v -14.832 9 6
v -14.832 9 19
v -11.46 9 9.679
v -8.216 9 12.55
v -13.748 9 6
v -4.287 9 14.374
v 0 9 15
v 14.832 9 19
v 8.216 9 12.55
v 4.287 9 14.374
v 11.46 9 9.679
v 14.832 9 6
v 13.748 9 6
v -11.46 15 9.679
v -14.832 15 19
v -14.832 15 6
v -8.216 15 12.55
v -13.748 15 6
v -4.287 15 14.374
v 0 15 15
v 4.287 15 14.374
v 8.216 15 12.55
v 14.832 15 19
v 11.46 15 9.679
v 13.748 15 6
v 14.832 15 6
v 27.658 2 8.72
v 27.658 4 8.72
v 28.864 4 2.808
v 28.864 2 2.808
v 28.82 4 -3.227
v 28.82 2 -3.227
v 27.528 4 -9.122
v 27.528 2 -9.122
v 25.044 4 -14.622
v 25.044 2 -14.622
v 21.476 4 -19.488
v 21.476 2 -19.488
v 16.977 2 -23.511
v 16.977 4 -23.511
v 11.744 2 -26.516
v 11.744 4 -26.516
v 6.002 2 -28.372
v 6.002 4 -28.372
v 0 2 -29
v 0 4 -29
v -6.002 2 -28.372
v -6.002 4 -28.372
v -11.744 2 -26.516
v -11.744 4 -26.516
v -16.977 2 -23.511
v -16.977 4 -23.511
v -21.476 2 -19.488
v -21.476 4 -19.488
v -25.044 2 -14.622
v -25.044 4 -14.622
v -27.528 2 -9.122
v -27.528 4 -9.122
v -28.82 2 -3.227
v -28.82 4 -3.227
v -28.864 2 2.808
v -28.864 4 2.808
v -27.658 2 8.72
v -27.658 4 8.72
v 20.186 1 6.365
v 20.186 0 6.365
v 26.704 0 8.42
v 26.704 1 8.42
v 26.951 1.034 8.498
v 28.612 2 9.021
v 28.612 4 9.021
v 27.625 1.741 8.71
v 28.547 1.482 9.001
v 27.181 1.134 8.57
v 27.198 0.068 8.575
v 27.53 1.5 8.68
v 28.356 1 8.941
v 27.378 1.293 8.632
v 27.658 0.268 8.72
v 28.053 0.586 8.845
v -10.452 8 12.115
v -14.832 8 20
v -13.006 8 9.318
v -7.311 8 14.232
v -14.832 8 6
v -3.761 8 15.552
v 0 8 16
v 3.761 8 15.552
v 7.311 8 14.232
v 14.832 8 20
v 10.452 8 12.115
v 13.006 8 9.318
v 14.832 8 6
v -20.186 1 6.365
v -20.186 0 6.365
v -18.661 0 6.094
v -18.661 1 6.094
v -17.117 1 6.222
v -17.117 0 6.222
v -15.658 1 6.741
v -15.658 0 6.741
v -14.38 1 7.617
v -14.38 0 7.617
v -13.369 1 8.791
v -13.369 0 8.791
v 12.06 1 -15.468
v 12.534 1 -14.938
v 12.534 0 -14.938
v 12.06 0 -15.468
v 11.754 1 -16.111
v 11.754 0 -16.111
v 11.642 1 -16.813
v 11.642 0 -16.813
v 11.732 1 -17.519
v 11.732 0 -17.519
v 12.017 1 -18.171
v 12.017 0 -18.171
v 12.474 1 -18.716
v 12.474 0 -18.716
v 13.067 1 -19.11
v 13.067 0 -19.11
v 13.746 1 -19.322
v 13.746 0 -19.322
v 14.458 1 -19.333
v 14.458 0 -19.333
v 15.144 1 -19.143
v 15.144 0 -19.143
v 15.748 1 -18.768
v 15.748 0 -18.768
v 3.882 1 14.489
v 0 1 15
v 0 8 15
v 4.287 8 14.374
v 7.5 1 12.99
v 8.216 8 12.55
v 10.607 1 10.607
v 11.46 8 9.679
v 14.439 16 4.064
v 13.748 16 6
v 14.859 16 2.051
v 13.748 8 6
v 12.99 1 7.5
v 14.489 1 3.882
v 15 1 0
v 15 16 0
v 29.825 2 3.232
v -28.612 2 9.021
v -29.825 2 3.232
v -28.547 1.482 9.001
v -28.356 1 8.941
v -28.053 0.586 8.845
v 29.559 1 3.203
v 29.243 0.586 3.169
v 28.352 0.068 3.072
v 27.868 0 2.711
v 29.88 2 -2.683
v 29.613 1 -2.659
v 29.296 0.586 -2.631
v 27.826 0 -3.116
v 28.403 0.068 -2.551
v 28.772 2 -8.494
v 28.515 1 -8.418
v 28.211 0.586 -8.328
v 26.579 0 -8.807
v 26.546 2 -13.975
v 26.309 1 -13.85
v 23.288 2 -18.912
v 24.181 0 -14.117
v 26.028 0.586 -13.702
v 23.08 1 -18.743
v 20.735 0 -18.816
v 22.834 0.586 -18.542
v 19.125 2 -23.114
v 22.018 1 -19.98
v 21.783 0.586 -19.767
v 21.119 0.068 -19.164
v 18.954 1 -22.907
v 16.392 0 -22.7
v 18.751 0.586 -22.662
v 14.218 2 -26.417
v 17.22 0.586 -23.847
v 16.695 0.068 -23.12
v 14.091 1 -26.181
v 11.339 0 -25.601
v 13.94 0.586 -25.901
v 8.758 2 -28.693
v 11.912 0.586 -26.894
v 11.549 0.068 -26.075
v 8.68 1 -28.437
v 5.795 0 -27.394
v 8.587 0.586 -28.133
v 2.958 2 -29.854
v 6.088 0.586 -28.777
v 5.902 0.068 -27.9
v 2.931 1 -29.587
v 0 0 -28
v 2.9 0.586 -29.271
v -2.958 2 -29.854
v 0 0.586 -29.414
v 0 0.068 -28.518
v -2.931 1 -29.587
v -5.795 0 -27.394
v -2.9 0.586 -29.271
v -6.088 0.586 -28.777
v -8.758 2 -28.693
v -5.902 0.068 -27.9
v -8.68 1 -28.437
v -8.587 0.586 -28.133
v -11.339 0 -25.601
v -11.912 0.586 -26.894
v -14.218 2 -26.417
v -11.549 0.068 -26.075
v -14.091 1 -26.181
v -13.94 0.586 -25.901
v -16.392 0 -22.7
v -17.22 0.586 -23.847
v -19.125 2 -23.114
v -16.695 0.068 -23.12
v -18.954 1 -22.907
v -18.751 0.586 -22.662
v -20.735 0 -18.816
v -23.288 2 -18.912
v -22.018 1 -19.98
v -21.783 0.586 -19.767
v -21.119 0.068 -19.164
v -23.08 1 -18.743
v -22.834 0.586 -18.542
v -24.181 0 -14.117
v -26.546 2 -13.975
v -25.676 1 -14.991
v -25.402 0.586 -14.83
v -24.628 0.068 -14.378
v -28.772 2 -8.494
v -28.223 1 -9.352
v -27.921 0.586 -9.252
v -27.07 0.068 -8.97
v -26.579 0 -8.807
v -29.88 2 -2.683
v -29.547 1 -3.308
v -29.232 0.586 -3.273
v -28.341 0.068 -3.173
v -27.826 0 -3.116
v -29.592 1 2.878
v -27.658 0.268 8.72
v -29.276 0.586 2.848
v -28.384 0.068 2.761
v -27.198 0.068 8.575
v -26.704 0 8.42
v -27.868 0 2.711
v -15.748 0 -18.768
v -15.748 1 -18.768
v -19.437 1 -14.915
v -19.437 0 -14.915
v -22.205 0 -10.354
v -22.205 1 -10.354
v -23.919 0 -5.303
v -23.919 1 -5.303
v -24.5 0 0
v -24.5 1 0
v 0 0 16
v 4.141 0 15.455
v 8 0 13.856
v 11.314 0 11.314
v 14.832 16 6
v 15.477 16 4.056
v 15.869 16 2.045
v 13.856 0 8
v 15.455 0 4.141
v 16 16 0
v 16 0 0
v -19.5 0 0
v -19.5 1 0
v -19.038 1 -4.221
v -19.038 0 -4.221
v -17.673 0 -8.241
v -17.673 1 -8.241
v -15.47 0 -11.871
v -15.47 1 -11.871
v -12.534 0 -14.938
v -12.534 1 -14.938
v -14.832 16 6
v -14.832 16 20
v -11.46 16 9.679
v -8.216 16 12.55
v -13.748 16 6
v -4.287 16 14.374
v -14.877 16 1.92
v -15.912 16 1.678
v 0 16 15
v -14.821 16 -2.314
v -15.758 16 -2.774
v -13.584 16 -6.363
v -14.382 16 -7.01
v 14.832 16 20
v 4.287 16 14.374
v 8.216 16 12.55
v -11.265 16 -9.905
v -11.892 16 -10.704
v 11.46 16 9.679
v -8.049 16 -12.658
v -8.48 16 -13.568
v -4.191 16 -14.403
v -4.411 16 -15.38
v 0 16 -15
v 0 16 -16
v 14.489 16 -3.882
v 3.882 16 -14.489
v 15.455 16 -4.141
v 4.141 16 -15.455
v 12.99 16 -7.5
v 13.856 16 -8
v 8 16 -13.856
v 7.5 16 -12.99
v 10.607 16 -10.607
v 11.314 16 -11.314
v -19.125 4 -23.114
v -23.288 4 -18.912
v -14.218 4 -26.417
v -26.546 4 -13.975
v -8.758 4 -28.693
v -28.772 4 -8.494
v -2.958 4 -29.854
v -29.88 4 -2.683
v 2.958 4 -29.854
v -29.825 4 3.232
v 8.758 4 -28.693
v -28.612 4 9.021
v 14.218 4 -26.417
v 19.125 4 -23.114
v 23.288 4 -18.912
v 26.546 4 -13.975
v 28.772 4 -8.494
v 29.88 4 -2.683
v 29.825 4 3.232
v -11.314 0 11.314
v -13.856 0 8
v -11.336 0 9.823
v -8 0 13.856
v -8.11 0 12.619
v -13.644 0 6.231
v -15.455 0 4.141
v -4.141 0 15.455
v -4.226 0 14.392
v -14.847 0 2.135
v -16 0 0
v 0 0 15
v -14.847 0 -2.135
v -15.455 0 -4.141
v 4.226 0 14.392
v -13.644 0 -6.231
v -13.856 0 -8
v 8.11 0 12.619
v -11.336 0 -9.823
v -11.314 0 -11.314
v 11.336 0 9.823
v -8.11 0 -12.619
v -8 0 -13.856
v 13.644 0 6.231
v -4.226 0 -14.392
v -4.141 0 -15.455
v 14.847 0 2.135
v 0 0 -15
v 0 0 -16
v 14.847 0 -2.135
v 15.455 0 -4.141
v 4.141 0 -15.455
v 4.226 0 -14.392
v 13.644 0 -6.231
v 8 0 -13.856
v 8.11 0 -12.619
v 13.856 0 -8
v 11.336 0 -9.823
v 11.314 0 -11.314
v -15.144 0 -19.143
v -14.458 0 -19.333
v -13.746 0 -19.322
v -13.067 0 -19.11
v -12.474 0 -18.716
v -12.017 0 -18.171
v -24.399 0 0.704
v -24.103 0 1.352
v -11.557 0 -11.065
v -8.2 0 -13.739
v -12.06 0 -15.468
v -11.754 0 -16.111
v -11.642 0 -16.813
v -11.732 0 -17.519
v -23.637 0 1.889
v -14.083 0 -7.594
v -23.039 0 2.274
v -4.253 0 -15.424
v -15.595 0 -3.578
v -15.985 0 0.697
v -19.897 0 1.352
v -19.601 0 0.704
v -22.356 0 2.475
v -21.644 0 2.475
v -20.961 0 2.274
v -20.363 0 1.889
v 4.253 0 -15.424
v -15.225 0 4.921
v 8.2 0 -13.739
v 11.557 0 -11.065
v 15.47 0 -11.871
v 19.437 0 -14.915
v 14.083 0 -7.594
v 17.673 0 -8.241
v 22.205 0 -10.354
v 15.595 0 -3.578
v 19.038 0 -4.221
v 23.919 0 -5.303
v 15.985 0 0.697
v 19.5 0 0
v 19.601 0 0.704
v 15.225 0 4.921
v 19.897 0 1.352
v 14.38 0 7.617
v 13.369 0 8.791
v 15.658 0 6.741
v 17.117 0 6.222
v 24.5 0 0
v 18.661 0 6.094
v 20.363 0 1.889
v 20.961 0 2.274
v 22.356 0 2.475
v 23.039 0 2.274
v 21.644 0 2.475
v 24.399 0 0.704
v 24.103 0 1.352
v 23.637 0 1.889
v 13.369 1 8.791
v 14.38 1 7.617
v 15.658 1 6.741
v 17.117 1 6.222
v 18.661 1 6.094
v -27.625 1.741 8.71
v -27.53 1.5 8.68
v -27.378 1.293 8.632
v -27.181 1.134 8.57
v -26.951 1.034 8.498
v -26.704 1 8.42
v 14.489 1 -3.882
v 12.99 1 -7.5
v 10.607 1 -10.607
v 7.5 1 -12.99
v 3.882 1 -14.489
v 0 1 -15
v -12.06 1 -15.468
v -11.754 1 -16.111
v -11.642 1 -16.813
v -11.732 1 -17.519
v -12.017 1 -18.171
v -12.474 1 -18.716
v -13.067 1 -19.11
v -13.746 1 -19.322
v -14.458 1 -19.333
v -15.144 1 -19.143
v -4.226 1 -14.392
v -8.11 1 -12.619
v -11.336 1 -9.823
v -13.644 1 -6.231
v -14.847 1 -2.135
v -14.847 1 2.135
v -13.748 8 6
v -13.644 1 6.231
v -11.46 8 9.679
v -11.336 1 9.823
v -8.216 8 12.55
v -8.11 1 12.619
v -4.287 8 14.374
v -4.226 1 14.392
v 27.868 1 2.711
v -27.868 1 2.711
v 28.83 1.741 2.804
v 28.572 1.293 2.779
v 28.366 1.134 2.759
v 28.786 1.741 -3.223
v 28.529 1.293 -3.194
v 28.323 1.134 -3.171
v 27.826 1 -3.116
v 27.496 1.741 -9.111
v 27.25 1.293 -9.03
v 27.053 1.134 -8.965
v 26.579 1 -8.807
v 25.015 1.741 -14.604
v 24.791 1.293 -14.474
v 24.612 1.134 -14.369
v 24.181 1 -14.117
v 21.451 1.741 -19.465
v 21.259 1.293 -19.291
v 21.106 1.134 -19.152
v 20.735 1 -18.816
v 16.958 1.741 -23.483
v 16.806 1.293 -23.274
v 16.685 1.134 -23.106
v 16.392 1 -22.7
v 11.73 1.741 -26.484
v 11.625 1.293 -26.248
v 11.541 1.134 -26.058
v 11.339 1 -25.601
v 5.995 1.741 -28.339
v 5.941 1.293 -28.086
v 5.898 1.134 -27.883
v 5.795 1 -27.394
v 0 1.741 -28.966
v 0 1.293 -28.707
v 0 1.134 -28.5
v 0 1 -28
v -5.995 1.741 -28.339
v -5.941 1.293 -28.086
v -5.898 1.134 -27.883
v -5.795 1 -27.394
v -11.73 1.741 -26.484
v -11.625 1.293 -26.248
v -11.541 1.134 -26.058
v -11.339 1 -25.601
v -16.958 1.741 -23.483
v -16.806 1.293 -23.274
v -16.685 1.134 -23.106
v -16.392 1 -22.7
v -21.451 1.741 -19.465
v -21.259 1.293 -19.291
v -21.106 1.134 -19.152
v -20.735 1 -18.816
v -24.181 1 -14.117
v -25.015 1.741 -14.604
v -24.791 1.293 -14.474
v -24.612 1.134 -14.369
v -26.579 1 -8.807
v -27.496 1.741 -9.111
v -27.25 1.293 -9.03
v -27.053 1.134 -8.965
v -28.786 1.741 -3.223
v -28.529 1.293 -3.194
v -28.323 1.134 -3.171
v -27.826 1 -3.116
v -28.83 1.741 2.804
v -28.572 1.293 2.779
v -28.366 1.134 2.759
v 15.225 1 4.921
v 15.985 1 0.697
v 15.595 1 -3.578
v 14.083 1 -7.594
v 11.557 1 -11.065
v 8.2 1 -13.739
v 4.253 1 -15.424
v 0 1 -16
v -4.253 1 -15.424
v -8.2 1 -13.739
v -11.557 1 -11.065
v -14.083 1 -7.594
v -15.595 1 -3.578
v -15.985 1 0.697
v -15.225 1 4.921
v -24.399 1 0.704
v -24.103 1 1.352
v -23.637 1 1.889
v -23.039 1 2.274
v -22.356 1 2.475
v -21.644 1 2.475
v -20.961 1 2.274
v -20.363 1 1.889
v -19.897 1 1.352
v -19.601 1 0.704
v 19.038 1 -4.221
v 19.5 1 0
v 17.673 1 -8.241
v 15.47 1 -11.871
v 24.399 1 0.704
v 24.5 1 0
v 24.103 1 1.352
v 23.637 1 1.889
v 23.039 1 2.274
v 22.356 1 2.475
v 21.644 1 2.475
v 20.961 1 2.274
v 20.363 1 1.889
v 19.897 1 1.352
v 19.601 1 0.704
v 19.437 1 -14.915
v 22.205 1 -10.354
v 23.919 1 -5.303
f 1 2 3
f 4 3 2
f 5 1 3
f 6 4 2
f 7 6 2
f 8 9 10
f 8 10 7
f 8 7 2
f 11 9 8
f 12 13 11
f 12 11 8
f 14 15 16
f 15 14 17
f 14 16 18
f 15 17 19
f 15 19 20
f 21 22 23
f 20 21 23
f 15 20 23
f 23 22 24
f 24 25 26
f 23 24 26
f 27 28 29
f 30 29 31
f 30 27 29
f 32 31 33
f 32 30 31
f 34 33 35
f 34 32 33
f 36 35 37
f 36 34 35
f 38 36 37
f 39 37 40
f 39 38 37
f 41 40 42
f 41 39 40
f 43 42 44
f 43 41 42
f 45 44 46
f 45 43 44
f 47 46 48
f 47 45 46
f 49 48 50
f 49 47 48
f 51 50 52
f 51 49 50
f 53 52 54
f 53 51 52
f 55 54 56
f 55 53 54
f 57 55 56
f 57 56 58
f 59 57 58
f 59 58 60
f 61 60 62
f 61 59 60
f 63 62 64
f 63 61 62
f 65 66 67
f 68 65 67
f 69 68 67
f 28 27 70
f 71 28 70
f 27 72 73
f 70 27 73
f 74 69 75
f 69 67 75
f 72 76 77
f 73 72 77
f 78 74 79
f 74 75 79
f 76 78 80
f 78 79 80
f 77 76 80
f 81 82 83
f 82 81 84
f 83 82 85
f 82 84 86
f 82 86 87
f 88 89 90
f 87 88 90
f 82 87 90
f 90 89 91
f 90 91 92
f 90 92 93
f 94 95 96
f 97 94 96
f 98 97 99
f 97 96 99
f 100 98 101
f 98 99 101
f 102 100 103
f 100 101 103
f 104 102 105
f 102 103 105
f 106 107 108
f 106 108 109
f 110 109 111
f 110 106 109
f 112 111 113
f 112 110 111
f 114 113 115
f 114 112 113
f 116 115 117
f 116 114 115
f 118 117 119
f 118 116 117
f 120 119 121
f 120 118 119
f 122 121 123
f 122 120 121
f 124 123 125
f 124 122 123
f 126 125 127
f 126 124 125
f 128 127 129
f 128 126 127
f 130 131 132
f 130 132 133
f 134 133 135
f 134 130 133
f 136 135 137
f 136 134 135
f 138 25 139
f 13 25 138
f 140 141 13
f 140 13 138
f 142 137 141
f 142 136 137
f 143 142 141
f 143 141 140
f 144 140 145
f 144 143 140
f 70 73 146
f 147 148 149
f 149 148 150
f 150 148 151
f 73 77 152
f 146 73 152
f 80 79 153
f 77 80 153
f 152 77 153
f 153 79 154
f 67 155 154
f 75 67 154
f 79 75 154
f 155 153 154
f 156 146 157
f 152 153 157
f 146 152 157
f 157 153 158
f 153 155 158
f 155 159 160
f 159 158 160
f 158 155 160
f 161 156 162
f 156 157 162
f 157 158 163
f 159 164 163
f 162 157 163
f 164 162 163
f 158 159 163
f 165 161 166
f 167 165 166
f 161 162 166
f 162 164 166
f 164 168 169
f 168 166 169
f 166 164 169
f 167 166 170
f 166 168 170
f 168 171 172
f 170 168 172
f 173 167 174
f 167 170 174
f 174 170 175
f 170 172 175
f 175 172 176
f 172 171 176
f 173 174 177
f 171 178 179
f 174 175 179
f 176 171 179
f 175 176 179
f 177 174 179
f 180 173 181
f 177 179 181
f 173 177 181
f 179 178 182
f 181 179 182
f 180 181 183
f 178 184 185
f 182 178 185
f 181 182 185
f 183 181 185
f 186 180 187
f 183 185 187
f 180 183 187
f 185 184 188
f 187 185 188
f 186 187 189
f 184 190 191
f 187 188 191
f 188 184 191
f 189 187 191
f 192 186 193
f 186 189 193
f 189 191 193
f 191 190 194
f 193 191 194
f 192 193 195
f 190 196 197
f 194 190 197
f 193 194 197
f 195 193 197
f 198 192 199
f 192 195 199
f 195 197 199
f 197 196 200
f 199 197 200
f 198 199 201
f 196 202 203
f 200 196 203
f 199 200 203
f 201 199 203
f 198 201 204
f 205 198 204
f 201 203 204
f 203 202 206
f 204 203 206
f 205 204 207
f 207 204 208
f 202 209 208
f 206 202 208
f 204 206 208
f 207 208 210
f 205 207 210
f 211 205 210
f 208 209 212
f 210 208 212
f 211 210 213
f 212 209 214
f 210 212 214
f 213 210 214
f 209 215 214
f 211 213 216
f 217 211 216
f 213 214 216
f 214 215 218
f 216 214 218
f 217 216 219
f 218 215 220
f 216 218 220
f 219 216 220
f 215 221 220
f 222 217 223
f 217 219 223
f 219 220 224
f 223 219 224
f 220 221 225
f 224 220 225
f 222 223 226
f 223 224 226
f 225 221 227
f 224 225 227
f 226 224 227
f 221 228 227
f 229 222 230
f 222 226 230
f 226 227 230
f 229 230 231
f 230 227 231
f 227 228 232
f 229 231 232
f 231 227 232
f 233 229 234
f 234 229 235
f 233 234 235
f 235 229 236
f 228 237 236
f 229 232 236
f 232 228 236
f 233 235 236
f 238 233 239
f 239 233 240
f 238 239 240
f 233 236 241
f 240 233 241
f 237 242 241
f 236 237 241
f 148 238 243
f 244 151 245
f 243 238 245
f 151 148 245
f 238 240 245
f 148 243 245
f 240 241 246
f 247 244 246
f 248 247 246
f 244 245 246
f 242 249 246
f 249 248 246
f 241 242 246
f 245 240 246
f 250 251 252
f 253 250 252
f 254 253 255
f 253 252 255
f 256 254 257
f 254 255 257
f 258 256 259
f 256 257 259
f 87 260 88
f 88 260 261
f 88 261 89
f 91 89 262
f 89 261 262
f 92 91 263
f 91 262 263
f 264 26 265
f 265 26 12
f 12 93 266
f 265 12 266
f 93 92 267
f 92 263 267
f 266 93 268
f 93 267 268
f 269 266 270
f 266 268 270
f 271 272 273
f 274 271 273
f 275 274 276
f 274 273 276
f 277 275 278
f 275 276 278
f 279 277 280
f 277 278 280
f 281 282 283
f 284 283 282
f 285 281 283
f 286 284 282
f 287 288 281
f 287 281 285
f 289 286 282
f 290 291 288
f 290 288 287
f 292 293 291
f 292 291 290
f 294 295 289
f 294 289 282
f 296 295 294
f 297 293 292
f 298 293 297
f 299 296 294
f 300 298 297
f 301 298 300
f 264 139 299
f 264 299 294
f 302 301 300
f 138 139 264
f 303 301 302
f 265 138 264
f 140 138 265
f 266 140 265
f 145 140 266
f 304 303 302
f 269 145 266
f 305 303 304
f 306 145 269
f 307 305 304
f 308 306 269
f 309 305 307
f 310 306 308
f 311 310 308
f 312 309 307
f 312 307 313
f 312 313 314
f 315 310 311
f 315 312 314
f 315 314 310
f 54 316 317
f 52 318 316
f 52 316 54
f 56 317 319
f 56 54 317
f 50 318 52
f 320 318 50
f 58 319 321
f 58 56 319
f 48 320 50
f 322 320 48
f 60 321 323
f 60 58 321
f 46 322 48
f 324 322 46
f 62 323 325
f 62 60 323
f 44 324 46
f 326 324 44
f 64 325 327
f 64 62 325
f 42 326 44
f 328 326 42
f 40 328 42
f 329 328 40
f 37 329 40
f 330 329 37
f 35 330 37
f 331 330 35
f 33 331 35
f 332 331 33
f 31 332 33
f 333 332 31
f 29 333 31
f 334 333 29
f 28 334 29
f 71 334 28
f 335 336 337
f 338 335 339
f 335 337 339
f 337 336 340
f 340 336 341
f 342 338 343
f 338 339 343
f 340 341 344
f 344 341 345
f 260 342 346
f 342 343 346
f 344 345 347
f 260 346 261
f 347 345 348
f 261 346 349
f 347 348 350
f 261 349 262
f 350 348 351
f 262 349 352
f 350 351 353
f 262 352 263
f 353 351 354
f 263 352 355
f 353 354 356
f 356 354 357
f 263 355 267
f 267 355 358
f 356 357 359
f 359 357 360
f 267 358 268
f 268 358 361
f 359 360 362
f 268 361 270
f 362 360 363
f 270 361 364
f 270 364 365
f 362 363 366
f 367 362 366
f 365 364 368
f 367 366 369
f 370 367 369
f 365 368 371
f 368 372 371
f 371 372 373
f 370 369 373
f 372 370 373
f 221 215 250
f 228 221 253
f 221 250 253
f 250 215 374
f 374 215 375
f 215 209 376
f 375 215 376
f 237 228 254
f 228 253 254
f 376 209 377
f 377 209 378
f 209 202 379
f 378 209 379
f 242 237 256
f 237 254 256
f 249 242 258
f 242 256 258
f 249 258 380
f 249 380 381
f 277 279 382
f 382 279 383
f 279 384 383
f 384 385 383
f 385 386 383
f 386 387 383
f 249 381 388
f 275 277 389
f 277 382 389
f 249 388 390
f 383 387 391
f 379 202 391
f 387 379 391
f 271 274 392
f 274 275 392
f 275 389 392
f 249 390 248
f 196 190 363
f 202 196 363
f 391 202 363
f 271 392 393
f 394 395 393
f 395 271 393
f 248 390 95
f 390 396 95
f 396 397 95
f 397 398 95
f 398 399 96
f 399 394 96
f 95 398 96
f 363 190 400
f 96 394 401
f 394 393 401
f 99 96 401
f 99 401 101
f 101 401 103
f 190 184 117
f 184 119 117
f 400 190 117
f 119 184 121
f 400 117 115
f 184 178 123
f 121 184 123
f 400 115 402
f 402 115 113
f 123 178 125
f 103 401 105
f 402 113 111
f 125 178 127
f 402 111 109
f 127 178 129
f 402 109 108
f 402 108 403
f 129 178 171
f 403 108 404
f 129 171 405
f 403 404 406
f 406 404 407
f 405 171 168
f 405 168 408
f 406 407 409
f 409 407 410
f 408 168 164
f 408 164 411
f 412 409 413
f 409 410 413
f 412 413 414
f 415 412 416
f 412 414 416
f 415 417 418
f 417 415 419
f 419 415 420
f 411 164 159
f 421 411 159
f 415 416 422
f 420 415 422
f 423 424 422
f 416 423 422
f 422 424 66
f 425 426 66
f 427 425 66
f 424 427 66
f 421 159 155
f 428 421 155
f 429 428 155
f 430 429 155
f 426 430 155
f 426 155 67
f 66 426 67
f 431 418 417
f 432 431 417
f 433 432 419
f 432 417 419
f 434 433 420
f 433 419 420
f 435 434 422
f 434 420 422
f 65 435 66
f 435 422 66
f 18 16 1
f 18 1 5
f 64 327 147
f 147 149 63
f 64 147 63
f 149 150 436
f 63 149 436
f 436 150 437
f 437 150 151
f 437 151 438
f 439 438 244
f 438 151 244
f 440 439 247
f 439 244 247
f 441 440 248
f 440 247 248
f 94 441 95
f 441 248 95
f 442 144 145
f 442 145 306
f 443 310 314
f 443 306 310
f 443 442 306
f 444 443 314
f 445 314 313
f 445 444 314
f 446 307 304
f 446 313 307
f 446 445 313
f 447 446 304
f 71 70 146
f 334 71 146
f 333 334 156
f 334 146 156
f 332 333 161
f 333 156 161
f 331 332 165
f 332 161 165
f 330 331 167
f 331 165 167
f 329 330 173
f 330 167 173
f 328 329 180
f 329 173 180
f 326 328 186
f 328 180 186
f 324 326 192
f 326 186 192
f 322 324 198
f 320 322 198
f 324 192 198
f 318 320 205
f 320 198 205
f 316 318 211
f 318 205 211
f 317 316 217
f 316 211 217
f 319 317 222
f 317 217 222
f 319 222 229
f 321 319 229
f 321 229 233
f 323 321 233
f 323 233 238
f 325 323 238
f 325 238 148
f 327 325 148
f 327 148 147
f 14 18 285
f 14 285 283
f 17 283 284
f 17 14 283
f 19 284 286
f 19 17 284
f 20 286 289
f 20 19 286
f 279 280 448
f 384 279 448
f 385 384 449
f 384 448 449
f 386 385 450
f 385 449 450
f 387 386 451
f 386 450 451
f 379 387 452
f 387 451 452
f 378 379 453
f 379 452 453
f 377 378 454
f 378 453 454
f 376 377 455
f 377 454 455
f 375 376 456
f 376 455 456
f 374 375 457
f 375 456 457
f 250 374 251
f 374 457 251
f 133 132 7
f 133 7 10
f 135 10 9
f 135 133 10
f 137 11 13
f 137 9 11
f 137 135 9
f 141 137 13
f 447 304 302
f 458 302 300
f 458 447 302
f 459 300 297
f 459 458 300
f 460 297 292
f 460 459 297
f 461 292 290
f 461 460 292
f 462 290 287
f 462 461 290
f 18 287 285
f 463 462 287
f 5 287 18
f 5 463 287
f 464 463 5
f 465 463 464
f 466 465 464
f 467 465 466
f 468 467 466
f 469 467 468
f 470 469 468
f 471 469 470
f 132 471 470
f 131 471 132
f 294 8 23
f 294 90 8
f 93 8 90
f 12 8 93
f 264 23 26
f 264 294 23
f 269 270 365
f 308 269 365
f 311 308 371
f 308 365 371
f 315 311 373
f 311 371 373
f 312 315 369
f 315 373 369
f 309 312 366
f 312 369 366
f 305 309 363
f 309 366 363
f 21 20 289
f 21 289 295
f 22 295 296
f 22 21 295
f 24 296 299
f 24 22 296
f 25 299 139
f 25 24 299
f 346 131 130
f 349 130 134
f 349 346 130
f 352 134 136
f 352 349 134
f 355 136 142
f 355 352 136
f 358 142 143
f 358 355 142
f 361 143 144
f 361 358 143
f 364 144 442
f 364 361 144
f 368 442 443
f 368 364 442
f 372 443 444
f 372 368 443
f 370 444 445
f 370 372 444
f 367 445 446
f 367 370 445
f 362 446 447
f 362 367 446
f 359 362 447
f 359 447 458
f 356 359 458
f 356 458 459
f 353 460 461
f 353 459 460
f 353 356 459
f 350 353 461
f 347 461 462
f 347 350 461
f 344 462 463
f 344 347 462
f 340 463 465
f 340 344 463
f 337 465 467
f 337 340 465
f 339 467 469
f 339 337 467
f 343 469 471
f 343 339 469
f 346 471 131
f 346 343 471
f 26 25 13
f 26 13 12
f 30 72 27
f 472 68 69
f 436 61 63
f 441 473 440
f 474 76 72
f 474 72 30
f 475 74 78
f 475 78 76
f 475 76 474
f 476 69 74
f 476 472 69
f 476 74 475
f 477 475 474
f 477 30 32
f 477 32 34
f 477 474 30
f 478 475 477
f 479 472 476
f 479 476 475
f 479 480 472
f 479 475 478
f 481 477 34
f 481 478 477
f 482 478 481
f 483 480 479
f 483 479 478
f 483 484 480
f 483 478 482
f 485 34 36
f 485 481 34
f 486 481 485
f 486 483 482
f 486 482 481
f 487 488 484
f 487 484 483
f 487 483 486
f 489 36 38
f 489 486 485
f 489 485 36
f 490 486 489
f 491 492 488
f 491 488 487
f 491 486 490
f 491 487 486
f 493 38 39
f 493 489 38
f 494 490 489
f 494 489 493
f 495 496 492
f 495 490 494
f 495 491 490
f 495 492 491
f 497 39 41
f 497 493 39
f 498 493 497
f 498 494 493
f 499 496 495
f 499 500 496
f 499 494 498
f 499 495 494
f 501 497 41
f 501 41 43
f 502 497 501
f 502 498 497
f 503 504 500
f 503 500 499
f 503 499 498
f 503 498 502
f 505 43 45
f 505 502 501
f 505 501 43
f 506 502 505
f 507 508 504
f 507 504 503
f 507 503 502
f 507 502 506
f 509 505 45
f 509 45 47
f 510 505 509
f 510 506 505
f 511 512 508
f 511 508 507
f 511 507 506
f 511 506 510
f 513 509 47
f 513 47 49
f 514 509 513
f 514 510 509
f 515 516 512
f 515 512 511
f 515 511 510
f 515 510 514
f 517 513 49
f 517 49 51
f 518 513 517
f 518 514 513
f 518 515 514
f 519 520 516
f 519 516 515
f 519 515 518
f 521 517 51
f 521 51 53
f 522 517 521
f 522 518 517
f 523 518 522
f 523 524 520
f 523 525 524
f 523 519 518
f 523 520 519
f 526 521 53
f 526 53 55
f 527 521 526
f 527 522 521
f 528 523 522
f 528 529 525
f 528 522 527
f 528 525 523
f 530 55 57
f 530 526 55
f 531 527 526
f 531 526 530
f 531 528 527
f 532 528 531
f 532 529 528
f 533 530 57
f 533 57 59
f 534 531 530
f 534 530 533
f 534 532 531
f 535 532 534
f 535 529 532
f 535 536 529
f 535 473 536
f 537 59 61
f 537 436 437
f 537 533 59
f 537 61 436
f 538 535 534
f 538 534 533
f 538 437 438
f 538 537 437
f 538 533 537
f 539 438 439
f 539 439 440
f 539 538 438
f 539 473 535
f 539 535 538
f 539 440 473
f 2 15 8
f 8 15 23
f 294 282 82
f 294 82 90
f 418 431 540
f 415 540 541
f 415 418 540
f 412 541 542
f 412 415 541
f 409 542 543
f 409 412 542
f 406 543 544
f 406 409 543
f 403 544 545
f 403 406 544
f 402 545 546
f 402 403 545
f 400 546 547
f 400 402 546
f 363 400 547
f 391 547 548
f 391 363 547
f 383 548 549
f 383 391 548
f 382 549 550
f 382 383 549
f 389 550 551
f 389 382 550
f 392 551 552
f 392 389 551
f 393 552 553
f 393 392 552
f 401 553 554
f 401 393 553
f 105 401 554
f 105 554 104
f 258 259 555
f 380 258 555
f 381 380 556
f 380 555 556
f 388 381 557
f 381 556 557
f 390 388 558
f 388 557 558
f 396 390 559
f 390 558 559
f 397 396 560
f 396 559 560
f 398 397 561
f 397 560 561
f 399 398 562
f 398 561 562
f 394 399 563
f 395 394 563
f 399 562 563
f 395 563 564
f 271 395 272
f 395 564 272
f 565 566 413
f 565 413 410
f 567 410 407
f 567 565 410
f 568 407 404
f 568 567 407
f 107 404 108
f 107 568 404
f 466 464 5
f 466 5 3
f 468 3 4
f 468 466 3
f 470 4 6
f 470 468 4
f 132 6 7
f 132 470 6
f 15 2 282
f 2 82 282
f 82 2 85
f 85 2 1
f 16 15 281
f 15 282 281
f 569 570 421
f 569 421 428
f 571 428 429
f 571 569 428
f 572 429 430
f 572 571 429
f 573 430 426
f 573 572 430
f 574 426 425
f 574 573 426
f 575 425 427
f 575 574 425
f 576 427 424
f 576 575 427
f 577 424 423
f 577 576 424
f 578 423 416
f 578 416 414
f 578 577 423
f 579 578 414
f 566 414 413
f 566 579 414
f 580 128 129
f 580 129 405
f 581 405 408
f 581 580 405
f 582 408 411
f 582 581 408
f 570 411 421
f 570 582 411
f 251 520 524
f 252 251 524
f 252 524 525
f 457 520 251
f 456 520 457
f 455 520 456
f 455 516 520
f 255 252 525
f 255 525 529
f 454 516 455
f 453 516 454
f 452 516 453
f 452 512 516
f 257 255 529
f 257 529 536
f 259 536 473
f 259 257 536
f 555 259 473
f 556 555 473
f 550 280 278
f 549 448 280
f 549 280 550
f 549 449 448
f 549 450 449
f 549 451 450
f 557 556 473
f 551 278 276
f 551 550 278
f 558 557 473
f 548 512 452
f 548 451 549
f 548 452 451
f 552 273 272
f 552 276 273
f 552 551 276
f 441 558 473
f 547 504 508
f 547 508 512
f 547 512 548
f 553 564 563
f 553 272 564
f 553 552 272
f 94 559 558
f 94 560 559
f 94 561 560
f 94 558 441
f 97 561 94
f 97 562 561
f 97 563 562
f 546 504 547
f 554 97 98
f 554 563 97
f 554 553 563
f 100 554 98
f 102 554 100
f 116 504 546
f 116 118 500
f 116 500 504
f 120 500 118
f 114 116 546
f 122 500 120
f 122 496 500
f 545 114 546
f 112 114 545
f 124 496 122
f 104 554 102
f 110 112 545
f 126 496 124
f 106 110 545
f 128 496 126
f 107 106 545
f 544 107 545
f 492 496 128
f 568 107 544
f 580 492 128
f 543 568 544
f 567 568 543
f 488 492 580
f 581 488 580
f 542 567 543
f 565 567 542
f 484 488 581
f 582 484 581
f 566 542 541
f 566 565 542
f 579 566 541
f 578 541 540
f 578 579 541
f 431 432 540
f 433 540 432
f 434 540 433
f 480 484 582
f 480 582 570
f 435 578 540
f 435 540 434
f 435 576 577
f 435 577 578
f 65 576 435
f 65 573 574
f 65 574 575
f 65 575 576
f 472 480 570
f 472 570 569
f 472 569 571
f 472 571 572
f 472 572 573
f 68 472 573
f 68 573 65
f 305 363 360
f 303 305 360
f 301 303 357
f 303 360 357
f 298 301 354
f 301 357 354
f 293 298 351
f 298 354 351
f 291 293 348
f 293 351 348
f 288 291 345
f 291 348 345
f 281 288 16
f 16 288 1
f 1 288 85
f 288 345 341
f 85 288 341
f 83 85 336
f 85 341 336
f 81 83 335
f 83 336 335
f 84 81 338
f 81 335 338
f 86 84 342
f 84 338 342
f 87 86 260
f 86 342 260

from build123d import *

# Parameters (mm, degrees)
SKETCH_1_R               = 30
SKETCH_1_R_2             = 16
EXTRUDE_1_DEPTH          = 4
FILLET_1_R               = 2
SHELL_12_T               = -1
EXTRUDE_7_DEPTH          = 16
CUT_EXTRUDE_START        = -4
SKETCH_7_R               = 16
CUT_EXTRUDE_5_DEPTH      = 4
CUT_EXTRUDE_6_DEPTH      = 1
SHELL_15_T               = -1
SKETCH_9_W               = 29.664793948
SKETCH_9_H               = 14
EXTRUDE_8_DEPTH          = 8
SHELL_START              = 6
SHELL_16_OUTLINE_W       = 29.664793948
SHELL_16_OUTLINE_H       = 6
SHELL_16_DEPTH           = 13
CUT_EXTRUDE_9_DEPTH      = 46.000000133
CUT_EXTRUDE_9_DEPTH_BACK = 46.000000133
SKETCH_10_R              = 15


# Read off the part's stored shape, not the designer's step: 抽壳16
with BuildPart() as part:
    # 草图1 → 凸台-拉伸1 (new body)
    with BuildSketch(Plane(origin=(0, 0, 0), x_dir=(1, 0, 0), z_dir=(0, 1, 0))):
        with Locations(Location((0, 0, 0), (0, 0, 270))):
            Circle(SKETCH_1_R)
        with Locations(Location((0, 0, 0), (0, 0, 270))):
            Circle(SKETCH_1_R_2, mode=Mode.SUBTRACT)
    extrude(amount=EXTRUDE_1_DEPTH)

    # 圆角1
    fillet_1_edges = [part.edges().sort_by_distance(p)[0] for p in [
        (0, 0, -30),
    ]]
    fillet(fillet_1_edges, radius=FILLET_1_R)

    # 抽壳12
    shell_12_openings = [part.faces().sort_by_distance(p)[0] for p in [
        (0, 4, -29.151471863),
        (0, 2, -16),
    ]]
    offset(amount=SHELL_12_T, openings=shell_12_openings, kind=Kind.INTERSECTION)

    # 草图7 → 切除-拉伸5 (cut)
    with BuildSketch(Plane(origin=(0, 4, 0), x_dir=(1, 0, 0), z_dir=(0, 1, 0)).offset(CUT_EXTRUDE_START)):
        with Locations(Location((0, 0, 0), (0, 0, 270))):
            Circle(SKETCH_7_R)
        with BuildLine():
            Line((-28.611508522, -9.021173985), (-20.186382983, -6.364742106))
            ThreePointArc((-20.186382983, -6.364742106), (-16.370751886, -6.434231685), (-13.368835044, -8.790577317))
            ThreePointArc((-13.368835044, -8.790577317), (0, -16), (13.368835044, -8.790577317))
            ThreePointArc((13.368835044, -8.790577317), (16.370751886, -6.434231685), (20.186382983, -6.364742106))
            Line((20.186382983, -6.364742106), (28.611508522, -9.021173985))
            ThreePointArc((28.611508522, -9.021173985), (0, -30), (-28.611508522, -9.021173985))
        make_face()
    extrude(amount=CUT_EXTRUDE_5_DEPTH, mode=Mode.SUBTRACT)

    # 草图8 → 切除-拉伸6 (cut)
    with BuildSketch(Plane(origin=(0, 1, 0), x_dir=(1, 0, 0), z_dir=(0, 1, 0))):
        with BuildLine():
            ThreePointArc((-15.748296437, 18.768088856), (-22.204540782, 10.354147413), (-24.5, 0))
            ThreePointArc((-24.5, 0), (-22, -2.5), (-19.5, 0))
            ThreePointArc((-19.5, 0), (-17.673001847, 8.241056104), (-12.534358389, 14.937866641))
            ThreePointArc((-12.534358389, 14.937866641), (-12.226216305, 18.459946773), (-15.748296437, 18.768088856))
        make_face()
        with BuildLine():
            ThreePointArc((15.748296437, 18.768088856), (22.204540782, 10.354147413), (24.5, 0))
            ThreePointArc((24.5, 0), (22, -2.5), (19.5, 0))
            ThreePointArc((19.5, 0), (17.673001847, 8.241056104), (12.534358389, 14.937866641))
            ThreePointArc((12.534358389, 14.937866641), (12.226216305, 18.459946773), (15.748296437, 18.768088856))
        make_face()
    extrude(amount=-CUT_EXTRUDE_6_DEPTH, mode=Mode.SUBTRACT)


with BuildPart() as body_2:
    # 草图1<8> → 凸台-拉伸7 (new body)
    with BuildSketch(Plane(origin=(0, 0, 0), x_dir=(1, 0, 0), z_dir=(0, 1, 0))):
        with BuildLine():
            ThreePointArc((16, 0), (11.313708499, 11.313708499), (0, 16))
            Line((0, 16), (0, -16))
            ThreePointArc((0, -16), (11.313708499, -11.313708499), (16, 0))
        make_face()
        with BuildLine():
            Line((0, -16), (0, 16))
            ThreePointArc((0, 16), (-16, 0), (0, -16))
        make_face()
    extrude(amount=EXTRUDE_7_DEPTH)

    # 抽壳15
    shell_15_openings = [body_2.faces().sort_by_distance(p)[0] for p in [
        (0, 16, 0),
    ]]
    offset(amount=SHELL_15_T, openings=shell_15_openings, kind=Kind.INTERSECTION)

    # 草图9 → 凸台-拉伸8 (add)
    with BuildSketch(Plane(origin=(0, 16, 0), x_dir=(1, 0, 0), z_dir=(0, 1, 0))):
        with Locations((0, -13)):
            Rectangle(SKETCH_9_W, SKETCH_9_H)
    extrude(amount=-EXTRUDE_8_DEPTH)

    # 抽壳16 outline → 抽壳16 (cut)
    with BuildSketch(Plane.XY.offset(SHELL_START)):
        with Locations((0, 12)):
            Rectangle(SHELL_16_OUTLINE_W, SHELL_16_OUTLINE_H)
    extrude(amount=SHELL_16_DEPTH, mode=Mode.SUBTRACT)

    # 草图10 → 切除-拉伸9 (cut, two sides: drawn at the far end of the back side and taken through both)
    with BuildSketch(Plane(origin=(0, 1, 0), x_dir=(1, 0, 0), z_dir=(0, 1, 0)).offset(-CUT_EXTRUDE_9_DEPTH_BACK)):
        with Locations(Location((0, 0, 0), (0, 0, 270))):
            Circle(SKETCH_10_R)
    extrude(amount=CUT_EXTRUDE_9_DEPTH + CUT_EXTRUDE_9_DEPTH_BACK, mode=Mode.SUBTRACT)


solid = Compound([part.part, body_2.part])
